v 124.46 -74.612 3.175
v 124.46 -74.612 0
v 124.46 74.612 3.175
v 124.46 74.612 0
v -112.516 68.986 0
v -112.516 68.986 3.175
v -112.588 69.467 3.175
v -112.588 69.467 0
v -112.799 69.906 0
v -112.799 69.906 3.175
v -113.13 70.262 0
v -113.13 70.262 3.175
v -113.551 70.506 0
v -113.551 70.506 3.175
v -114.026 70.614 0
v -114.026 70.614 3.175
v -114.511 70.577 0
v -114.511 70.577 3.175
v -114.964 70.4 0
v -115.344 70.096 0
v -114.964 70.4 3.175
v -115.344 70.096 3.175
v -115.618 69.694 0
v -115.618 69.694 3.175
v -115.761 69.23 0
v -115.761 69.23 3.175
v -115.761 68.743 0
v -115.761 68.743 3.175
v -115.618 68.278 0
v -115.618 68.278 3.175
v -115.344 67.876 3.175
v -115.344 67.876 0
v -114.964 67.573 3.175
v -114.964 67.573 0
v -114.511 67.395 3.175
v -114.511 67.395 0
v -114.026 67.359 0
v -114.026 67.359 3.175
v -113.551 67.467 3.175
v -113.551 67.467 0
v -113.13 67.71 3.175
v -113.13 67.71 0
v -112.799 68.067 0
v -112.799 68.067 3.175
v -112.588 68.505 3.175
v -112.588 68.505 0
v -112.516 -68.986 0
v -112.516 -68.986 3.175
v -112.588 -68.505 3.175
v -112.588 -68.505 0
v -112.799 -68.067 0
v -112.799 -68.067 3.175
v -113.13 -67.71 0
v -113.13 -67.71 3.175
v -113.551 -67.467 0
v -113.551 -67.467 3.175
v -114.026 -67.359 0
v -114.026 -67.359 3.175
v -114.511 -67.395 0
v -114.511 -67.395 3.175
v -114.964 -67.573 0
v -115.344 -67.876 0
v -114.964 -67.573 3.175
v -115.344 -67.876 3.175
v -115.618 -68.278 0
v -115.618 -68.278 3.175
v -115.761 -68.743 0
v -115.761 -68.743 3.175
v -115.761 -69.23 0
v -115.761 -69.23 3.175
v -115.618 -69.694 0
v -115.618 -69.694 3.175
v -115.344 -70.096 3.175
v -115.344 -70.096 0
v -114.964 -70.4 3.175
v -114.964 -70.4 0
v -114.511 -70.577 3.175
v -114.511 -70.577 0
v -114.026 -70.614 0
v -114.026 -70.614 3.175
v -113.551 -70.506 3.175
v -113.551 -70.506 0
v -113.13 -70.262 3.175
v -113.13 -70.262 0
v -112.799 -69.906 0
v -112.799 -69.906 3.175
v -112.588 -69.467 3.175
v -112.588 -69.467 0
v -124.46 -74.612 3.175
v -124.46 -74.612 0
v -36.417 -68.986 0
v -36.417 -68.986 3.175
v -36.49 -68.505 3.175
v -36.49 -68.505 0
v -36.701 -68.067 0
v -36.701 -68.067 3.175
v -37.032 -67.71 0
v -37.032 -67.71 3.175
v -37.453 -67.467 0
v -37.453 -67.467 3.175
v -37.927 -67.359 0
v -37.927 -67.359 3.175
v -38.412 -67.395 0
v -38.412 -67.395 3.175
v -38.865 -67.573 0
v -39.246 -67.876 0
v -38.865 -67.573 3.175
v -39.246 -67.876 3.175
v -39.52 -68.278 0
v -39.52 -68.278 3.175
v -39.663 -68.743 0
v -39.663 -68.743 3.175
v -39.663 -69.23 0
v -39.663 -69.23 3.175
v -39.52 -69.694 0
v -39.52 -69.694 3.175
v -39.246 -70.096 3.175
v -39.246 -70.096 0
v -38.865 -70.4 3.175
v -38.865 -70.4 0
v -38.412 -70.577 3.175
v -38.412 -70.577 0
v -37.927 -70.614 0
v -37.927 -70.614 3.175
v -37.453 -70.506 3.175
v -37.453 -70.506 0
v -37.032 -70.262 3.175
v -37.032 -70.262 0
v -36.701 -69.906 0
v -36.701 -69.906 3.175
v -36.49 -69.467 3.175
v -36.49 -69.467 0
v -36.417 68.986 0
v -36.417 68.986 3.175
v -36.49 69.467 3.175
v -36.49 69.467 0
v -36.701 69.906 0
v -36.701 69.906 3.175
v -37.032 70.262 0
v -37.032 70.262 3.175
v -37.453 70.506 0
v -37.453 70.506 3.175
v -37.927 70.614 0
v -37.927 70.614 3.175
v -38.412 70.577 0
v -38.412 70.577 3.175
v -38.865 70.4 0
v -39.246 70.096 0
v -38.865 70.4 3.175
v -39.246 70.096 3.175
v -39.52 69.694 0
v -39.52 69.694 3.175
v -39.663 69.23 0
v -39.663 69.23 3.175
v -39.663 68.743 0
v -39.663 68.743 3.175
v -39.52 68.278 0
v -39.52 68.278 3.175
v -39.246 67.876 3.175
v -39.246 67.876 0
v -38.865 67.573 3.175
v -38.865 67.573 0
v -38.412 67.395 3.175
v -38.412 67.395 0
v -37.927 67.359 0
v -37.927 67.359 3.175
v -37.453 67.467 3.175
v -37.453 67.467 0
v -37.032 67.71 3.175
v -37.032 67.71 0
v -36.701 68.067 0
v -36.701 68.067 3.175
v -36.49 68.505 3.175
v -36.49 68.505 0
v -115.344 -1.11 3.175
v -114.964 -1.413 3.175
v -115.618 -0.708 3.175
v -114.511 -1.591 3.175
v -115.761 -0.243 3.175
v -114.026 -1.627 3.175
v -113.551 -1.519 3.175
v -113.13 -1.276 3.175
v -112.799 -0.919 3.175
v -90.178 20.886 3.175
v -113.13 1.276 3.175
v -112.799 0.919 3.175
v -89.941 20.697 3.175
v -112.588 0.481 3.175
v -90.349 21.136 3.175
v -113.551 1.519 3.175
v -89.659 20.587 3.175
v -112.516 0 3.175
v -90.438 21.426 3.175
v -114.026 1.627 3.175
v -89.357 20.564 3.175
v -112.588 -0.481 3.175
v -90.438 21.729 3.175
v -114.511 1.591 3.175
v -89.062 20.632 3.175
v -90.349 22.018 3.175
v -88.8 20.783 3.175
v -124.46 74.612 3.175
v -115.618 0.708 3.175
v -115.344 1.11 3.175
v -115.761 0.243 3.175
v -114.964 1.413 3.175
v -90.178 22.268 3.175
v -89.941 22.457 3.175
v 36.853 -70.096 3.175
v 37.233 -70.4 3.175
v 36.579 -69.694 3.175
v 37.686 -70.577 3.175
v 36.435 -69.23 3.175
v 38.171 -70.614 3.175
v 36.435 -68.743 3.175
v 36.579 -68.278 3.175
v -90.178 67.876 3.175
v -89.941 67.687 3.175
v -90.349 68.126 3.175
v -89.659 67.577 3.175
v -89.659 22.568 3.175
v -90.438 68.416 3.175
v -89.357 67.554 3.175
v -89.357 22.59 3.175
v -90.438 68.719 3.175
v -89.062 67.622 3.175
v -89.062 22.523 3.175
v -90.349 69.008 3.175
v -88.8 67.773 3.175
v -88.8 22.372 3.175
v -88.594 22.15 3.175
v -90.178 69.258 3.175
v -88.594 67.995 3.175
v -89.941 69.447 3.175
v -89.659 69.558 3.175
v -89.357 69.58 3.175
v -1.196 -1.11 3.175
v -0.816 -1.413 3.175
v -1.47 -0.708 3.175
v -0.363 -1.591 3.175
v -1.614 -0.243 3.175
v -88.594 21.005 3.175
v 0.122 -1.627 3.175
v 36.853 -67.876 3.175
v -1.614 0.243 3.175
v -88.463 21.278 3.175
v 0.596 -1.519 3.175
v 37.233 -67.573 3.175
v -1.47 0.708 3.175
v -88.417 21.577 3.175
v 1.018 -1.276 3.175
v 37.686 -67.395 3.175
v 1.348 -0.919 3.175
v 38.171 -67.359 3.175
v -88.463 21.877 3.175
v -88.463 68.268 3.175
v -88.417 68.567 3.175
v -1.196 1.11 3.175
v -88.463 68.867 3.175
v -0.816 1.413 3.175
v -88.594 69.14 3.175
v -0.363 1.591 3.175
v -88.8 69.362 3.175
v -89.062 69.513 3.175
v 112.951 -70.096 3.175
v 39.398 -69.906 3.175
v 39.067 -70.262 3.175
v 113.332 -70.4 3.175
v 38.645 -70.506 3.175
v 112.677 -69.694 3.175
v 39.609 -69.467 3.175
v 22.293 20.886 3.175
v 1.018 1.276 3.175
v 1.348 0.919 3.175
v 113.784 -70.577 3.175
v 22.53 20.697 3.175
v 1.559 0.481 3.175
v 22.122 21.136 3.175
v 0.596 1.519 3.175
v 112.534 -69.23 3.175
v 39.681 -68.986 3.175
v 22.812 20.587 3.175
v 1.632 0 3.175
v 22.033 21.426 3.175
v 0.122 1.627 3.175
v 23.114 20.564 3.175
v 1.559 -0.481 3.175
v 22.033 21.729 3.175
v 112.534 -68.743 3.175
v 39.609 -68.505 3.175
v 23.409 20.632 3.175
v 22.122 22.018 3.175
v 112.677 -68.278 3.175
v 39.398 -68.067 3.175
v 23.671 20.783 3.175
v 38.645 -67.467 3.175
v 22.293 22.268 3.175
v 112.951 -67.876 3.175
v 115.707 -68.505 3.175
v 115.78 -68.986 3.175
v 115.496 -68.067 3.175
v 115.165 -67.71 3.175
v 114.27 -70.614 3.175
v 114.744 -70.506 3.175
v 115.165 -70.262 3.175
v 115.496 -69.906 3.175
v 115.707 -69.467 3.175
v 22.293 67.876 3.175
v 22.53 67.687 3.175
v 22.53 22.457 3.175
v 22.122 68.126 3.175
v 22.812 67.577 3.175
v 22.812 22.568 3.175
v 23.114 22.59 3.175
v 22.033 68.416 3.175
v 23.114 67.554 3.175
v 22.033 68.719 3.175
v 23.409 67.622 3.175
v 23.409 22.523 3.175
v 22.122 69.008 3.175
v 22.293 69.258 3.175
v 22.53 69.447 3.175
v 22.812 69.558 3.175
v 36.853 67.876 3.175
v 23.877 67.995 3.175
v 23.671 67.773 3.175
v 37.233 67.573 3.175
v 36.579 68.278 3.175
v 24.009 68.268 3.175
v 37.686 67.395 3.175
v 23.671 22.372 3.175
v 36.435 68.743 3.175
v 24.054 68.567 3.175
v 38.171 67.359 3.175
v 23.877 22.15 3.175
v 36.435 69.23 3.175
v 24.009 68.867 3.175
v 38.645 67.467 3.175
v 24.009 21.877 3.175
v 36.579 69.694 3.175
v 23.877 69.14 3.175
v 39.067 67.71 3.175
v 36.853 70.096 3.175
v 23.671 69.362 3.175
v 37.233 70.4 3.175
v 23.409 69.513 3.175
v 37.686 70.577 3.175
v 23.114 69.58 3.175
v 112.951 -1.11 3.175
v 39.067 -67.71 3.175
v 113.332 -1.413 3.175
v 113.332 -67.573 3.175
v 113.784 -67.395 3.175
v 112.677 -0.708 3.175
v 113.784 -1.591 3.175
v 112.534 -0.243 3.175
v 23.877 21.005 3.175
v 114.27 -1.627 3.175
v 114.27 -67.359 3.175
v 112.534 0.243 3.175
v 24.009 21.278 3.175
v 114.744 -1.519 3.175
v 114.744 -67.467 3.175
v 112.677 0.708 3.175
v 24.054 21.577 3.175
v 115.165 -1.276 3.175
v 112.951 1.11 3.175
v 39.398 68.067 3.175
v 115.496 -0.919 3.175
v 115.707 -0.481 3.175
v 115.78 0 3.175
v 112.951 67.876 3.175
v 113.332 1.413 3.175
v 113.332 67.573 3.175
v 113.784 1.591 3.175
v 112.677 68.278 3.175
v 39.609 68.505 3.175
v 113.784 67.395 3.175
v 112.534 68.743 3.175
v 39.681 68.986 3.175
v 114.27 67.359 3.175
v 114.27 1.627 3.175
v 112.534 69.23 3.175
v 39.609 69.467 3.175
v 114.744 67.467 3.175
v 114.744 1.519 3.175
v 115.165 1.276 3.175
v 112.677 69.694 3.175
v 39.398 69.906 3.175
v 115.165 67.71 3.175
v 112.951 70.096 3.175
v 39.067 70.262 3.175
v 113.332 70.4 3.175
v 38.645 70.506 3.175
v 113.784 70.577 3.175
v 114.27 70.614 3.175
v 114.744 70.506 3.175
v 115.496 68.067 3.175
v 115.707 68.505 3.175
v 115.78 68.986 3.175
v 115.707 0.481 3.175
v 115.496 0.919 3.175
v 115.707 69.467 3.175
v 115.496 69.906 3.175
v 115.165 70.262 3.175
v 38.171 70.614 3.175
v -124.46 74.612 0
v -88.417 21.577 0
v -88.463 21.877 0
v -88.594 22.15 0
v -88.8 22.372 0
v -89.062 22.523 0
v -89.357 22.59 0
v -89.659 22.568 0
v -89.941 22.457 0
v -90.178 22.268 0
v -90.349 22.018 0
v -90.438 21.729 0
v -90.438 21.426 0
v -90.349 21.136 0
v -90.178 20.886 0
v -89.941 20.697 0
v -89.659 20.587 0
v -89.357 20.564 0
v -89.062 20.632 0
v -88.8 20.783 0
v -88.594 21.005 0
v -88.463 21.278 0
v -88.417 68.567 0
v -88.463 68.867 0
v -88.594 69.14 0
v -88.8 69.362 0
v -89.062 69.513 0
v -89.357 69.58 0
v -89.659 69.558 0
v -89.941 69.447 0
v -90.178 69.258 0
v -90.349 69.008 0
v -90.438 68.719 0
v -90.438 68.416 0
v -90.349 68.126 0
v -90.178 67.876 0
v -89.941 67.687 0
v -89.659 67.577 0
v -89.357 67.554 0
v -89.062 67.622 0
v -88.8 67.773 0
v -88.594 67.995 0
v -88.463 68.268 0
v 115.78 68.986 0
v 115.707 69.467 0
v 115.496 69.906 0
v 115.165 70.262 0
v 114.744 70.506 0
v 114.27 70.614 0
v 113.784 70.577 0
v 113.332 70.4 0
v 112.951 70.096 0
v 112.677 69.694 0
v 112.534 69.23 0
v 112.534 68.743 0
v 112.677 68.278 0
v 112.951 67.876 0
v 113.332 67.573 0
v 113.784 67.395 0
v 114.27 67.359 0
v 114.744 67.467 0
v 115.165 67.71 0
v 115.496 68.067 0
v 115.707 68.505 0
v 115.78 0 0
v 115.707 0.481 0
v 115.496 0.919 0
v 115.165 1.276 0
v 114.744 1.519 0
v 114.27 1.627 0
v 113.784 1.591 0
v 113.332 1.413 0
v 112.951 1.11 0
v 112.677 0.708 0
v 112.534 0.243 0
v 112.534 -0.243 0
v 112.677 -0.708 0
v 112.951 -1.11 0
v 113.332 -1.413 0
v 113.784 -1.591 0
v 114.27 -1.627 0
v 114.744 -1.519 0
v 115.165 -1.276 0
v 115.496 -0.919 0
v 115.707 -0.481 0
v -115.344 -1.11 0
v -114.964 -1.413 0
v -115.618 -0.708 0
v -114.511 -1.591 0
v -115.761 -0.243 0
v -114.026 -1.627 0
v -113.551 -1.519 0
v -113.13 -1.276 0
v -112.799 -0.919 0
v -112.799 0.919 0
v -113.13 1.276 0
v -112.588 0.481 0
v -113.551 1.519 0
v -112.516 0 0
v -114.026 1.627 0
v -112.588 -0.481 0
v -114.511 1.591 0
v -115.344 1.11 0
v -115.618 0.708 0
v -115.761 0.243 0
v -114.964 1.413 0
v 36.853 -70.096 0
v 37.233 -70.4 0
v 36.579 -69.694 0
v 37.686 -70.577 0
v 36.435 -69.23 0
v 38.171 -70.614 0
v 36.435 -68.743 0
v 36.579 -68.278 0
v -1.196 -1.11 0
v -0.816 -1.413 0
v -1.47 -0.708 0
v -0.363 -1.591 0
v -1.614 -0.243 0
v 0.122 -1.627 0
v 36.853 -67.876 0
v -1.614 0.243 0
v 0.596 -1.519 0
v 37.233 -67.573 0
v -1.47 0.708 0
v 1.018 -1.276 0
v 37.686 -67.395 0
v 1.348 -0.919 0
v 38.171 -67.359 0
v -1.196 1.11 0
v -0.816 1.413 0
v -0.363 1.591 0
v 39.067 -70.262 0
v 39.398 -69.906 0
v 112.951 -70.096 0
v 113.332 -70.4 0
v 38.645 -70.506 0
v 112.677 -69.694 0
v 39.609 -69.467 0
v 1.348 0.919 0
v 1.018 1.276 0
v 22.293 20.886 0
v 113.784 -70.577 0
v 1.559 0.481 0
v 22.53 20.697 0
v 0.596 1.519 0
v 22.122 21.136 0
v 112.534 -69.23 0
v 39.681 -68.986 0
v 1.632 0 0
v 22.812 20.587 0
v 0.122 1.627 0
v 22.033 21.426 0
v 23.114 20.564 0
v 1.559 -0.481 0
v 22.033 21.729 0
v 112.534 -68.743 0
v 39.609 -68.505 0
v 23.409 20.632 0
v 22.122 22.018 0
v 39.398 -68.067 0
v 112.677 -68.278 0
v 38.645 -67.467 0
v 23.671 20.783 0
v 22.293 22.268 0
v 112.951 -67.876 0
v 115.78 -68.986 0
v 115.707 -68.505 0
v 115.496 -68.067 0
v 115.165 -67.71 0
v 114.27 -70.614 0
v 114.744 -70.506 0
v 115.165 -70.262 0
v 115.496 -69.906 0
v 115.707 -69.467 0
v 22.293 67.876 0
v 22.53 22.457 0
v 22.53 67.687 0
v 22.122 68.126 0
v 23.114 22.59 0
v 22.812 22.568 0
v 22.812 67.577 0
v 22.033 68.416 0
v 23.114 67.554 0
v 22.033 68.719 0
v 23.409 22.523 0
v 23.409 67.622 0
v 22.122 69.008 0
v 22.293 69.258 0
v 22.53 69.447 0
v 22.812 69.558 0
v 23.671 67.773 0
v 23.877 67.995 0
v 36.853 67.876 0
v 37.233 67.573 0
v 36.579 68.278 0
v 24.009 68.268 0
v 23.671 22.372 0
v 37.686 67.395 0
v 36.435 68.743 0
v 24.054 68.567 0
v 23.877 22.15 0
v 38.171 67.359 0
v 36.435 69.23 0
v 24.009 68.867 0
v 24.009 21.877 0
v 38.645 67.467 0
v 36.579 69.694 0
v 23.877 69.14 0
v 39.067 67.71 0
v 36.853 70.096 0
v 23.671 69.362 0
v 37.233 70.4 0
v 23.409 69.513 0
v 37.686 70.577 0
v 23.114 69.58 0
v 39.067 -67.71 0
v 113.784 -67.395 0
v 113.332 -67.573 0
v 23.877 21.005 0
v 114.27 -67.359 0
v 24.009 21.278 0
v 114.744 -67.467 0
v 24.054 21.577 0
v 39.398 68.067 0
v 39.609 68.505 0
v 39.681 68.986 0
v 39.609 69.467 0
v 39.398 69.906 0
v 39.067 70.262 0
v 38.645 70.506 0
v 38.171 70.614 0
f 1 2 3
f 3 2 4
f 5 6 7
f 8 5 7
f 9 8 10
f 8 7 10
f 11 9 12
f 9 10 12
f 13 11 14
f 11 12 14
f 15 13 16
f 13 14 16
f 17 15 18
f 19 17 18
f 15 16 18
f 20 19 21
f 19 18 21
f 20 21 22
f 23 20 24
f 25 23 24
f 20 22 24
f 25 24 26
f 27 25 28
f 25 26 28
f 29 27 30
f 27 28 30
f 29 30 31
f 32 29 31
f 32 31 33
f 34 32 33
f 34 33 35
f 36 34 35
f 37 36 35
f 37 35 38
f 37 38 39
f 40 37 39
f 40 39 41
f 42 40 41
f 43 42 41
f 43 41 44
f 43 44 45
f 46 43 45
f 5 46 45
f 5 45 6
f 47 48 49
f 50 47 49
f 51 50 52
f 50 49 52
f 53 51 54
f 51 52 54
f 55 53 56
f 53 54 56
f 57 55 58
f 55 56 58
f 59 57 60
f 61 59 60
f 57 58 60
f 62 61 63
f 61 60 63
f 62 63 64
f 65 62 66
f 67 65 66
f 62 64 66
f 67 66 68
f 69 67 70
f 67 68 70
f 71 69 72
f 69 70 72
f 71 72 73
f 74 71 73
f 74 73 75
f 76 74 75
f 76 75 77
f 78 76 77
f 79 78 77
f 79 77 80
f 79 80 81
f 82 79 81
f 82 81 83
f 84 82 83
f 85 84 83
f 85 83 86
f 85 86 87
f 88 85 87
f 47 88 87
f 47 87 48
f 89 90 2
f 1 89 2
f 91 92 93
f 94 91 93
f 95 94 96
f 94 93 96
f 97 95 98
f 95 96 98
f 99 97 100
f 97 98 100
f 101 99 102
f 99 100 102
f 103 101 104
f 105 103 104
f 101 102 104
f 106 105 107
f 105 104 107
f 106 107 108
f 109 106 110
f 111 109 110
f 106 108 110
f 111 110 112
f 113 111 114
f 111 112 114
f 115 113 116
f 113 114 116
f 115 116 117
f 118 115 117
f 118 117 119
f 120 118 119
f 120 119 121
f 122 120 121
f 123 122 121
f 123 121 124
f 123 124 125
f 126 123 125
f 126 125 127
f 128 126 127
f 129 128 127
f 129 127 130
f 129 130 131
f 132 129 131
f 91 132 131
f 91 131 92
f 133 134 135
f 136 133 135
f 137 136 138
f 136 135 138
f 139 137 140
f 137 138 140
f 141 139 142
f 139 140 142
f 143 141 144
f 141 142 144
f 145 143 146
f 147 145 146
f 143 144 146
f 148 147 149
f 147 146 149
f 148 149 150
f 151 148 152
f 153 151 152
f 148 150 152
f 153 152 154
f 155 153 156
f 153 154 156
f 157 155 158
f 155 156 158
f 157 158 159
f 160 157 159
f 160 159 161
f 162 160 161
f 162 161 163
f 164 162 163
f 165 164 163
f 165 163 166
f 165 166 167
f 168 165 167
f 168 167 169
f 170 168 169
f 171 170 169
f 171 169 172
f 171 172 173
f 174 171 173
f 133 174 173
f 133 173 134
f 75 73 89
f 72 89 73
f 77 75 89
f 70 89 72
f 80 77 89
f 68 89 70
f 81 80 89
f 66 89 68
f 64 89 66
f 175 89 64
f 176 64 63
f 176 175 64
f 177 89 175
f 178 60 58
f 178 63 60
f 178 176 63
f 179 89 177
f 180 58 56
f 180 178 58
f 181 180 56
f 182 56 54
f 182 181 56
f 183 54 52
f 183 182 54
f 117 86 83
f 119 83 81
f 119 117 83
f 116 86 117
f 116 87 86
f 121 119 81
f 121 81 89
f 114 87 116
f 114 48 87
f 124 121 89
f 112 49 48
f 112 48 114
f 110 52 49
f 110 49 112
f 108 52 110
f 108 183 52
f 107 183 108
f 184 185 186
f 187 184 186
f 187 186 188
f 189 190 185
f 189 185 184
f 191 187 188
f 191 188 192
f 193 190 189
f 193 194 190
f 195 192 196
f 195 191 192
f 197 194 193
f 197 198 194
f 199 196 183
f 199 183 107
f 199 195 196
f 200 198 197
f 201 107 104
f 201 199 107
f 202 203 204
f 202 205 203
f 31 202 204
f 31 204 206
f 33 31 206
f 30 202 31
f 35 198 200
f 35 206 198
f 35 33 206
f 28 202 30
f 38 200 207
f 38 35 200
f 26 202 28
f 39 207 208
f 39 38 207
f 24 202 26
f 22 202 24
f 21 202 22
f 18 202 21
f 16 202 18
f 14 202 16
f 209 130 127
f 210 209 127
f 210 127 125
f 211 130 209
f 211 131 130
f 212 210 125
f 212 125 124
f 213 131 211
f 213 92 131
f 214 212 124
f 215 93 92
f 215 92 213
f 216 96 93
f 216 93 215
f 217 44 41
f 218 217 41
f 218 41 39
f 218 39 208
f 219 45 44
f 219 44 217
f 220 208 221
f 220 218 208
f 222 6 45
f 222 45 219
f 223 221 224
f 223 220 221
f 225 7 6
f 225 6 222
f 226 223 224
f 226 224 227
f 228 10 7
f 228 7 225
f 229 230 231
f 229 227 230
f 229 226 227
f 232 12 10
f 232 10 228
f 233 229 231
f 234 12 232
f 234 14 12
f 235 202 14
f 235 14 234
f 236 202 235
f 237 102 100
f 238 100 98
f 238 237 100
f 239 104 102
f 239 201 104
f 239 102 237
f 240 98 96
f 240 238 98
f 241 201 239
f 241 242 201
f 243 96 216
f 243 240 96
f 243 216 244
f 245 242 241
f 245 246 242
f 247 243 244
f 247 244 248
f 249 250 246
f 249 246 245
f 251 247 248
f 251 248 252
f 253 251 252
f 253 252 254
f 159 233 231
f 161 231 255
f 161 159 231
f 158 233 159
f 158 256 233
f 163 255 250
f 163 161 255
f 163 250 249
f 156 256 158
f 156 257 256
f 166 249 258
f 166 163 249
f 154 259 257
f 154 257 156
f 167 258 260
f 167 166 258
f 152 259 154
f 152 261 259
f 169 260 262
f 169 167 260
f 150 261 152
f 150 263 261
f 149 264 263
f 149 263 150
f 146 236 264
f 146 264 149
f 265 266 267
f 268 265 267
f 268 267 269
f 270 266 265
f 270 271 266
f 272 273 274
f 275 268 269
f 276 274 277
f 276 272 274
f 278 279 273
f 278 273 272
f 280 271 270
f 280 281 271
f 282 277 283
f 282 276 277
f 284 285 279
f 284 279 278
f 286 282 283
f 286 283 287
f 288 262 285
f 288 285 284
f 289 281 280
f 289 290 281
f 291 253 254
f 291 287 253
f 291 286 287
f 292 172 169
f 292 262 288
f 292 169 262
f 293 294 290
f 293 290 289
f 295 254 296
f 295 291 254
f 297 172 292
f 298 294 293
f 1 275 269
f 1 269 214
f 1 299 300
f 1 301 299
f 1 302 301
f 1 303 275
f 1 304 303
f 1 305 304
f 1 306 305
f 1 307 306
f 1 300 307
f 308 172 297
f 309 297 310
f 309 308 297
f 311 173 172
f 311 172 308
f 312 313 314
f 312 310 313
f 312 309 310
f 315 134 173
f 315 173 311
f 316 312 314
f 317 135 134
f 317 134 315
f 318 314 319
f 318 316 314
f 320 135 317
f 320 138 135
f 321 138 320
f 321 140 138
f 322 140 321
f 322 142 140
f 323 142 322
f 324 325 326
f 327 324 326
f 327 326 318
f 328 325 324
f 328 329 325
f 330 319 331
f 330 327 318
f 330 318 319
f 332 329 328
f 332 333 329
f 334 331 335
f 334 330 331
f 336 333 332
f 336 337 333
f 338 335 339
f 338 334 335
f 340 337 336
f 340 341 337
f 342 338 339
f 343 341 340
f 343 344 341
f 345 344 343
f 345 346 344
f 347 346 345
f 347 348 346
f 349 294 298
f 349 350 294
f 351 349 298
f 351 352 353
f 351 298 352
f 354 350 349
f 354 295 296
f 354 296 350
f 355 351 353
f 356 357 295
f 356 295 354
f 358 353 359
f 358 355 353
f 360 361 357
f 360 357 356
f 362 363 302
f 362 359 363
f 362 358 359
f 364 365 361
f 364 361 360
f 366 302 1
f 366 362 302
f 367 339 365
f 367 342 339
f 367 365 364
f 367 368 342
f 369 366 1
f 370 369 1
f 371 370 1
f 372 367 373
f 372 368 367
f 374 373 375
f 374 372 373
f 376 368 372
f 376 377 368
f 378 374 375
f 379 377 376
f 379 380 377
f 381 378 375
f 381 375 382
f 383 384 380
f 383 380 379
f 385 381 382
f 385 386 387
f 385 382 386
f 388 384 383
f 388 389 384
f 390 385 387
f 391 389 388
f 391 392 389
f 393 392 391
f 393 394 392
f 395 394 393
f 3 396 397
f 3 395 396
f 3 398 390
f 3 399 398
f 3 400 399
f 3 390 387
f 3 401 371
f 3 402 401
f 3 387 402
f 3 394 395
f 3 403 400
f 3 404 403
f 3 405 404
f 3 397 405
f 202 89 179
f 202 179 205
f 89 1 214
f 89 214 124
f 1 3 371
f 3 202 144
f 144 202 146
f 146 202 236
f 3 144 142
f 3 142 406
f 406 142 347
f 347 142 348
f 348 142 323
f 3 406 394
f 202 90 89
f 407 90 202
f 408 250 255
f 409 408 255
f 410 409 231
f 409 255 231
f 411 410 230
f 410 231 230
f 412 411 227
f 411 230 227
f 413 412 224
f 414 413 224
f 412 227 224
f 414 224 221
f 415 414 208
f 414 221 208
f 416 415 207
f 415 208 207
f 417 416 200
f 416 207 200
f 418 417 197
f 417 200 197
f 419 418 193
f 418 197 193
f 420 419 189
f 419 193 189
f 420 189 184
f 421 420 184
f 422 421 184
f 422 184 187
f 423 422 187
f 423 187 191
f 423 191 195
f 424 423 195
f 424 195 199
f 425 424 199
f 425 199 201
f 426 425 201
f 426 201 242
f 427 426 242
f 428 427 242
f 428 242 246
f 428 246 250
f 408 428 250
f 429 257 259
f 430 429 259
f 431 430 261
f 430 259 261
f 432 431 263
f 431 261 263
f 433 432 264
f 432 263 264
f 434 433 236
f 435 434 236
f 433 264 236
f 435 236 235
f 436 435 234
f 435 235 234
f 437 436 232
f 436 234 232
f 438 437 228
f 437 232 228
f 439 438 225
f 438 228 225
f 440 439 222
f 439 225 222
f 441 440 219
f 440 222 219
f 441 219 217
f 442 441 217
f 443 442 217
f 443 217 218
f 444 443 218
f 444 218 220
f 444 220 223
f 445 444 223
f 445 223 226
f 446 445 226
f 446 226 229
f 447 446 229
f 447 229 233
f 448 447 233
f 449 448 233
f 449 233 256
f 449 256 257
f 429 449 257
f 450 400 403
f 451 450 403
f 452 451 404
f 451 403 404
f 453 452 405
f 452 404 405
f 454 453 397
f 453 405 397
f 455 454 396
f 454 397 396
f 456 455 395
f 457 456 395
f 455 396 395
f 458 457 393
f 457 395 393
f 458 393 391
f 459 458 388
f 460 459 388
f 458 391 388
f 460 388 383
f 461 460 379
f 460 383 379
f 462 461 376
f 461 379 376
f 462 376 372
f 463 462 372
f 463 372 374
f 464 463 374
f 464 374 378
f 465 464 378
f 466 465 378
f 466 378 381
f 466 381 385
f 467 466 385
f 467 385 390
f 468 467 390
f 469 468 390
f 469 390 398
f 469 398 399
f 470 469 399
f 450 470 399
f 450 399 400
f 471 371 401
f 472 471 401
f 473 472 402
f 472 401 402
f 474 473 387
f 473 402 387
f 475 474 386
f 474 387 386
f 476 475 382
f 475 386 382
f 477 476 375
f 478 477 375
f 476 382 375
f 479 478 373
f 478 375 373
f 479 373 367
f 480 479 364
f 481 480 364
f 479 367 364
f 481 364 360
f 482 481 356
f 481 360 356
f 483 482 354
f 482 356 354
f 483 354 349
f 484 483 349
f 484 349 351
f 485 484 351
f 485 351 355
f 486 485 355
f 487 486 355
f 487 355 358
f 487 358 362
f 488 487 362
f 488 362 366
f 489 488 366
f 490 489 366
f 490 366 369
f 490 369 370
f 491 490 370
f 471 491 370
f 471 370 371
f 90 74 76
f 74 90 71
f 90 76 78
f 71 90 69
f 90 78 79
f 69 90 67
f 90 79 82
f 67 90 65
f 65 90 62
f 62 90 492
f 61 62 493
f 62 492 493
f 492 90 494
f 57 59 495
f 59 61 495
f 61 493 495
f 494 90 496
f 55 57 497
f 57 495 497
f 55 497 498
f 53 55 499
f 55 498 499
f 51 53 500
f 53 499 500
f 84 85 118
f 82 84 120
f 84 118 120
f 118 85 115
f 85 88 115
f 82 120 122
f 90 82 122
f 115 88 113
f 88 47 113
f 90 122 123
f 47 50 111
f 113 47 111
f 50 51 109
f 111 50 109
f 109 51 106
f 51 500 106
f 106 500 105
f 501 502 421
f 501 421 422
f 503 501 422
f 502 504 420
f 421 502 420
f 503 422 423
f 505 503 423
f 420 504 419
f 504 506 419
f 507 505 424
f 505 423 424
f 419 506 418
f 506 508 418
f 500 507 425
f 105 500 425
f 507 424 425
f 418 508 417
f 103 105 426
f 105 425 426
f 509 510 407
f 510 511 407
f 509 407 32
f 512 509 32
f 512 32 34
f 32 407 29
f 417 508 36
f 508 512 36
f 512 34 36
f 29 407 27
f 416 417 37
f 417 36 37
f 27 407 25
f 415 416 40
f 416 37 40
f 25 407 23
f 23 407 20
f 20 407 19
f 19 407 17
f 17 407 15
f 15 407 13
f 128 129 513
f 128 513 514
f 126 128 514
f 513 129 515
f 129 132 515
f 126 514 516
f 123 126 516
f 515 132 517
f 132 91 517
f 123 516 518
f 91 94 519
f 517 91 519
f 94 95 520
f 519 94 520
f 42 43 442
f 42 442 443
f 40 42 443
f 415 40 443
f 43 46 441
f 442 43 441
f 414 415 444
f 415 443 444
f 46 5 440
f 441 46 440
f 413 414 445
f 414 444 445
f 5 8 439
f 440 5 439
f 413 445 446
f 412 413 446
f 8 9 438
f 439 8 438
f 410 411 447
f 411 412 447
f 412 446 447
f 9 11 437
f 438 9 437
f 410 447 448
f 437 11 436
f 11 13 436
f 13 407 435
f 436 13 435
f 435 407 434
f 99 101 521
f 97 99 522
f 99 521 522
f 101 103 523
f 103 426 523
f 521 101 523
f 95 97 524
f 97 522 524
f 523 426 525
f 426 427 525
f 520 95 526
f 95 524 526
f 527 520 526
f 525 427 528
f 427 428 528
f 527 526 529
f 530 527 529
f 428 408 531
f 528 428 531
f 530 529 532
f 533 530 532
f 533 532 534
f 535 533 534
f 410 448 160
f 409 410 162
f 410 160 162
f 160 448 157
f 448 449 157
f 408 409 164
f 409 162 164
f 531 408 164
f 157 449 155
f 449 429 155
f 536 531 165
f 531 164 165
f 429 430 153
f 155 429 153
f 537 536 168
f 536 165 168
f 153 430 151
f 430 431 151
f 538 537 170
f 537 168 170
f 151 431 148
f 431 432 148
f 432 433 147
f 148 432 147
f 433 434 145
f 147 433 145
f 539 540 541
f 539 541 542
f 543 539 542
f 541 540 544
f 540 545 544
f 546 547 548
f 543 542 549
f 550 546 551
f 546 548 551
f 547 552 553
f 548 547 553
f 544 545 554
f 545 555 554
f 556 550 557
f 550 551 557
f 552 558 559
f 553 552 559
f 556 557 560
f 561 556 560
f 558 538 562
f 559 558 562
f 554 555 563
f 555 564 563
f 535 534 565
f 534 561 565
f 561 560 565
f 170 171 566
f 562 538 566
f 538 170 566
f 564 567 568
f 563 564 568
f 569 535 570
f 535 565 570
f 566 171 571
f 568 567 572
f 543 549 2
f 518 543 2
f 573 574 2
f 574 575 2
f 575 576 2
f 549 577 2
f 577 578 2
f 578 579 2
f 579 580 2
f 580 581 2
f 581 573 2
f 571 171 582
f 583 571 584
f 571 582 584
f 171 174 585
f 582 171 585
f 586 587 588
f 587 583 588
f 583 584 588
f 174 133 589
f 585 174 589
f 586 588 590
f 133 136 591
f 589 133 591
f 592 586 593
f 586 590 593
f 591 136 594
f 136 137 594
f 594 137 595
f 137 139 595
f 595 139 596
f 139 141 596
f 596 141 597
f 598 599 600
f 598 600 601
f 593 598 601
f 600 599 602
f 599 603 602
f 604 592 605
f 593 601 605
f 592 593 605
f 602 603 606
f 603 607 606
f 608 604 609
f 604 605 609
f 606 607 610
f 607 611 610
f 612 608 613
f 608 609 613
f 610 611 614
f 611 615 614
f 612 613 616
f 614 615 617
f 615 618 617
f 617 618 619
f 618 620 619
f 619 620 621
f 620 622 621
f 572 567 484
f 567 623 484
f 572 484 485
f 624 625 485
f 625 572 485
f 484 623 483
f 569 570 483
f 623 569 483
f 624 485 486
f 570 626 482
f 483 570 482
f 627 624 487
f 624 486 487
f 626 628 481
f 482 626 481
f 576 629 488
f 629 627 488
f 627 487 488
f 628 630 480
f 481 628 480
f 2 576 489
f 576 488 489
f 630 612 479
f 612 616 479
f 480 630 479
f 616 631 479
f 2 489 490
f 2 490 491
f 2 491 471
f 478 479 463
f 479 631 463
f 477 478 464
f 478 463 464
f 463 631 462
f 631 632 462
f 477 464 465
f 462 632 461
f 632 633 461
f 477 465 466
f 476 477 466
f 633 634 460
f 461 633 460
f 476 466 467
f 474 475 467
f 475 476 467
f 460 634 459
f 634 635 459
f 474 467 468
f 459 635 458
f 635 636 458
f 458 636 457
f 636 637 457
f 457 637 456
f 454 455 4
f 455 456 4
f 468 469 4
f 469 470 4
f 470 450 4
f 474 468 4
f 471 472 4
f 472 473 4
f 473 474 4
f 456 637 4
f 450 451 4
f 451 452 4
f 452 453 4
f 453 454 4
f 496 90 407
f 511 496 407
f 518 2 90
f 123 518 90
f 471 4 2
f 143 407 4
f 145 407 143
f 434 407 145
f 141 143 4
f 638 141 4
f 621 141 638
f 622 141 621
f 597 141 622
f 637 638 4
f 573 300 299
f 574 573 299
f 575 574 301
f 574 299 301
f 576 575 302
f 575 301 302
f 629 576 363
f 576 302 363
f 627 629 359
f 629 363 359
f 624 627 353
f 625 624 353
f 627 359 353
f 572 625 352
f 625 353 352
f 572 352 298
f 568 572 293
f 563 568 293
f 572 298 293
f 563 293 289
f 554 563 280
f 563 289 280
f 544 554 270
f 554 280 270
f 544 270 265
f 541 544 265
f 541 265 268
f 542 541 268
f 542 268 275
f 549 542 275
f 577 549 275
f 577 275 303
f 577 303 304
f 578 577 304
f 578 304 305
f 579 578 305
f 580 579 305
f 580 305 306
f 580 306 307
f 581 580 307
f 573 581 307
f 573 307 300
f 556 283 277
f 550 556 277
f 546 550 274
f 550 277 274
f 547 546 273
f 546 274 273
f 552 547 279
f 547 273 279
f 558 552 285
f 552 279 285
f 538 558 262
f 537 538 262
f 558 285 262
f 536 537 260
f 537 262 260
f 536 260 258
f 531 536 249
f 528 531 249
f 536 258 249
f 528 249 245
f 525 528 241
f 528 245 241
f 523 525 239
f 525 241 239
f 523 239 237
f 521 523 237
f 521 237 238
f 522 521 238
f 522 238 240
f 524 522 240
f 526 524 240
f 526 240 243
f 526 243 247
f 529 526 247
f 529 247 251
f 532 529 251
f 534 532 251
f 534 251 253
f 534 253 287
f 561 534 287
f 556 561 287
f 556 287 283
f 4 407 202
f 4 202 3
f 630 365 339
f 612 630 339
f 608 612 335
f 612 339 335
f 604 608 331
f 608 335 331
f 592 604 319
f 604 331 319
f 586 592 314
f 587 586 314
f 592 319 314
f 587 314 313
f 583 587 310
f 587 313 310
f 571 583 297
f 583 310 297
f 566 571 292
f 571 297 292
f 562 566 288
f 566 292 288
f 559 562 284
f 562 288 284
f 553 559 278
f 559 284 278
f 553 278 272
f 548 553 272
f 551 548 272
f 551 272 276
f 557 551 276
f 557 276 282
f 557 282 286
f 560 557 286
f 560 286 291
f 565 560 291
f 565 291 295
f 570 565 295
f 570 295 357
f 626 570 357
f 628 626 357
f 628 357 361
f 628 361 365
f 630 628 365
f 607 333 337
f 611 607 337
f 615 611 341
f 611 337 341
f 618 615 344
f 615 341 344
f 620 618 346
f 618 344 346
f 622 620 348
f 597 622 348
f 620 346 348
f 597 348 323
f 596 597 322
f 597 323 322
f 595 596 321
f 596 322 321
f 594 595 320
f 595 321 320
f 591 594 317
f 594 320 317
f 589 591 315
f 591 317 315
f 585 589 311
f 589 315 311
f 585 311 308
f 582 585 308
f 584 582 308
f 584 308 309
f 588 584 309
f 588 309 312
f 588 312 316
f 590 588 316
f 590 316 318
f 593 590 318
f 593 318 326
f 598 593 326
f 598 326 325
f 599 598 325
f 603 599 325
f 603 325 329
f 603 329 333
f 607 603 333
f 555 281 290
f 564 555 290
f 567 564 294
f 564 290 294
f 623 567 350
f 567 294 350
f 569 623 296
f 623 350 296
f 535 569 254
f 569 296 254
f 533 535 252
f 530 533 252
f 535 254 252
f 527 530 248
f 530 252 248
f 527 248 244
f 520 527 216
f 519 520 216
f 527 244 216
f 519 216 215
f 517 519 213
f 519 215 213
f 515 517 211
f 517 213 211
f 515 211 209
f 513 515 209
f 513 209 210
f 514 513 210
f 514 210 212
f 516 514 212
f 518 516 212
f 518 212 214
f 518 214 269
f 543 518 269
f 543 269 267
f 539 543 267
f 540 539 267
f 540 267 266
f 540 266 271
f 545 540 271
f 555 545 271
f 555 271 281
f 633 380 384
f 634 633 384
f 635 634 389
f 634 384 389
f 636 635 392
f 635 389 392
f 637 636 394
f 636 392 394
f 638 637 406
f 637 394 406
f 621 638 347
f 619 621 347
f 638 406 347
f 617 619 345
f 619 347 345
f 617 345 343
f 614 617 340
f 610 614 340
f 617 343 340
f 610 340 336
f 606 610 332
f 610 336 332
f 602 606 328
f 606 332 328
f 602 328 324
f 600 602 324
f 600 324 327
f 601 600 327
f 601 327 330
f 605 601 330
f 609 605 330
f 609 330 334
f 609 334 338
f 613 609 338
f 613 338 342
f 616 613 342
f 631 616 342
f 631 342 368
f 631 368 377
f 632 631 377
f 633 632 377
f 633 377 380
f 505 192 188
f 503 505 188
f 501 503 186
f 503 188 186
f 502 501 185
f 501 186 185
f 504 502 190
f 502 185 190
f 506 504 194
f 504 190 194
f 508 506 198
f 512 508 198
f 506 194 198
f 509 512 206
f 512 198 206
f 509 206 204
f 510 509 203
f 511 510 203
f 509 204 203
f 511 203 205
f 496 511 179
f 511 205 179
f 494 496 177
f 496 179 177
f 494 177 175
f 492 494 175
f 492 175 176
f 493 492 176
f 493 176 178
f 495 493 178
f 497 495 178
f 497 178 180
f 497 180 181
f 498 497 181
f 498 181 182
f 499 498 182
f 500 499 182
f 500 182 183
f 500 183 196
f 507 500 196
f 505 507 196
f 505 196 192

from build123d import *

# Parameters (mm, degrees)
SKETCH1_W                 = 248.92
SKETCH1_H                 = 149.225
BOSS_EXTRUDE1_DEPTH       = 3.175
F_4_CLEARANCE_HOLE1_D     = 3.2639
F_4_CLEARANCE_HOLE1_DEPTH = 56.388
F_4_CLEARANCE_HOLE1_TIP   = 0.980574487
F_4_40_TAPPED_HOLE1_D     = 2.032
F_4_40_TAPPED_HOLE1_DEPTH = 7.62
F_4_40_TAPPED_HOLE1_TIP   = 0.610474389


with BuildPart() as part:
    # Sketch1 → Boss-Extrude1 (new body)
    with BuildSketch(Plane.XY):
        Rectangle(SKETCH1_W, SKETCH1_H)
    extrude(amount=BOSS_EXTRUDE1_DEPTH)

    # #4 Clearance Hole1
    with Locations(Plane(origin=(0, 0, 0), x_dir=(-1, 0, 0), z_dir=(0, 0, -1))):
        with Locations((114.1476, -68.9864), (-114.1476, -68.9864), (-114.1476, 68.9864), (114.1476, 68.9864), (114.1476, 0), (-114.1476, 0), (38.0492, 68.9864), (-38.0492, 68.9864), (-38.0492, -68.9864), (38.0492, -68.9864), (0, 0)):
            Hole(F_4_CLEARANCE_HOLE1_D / 2, depth=F_4_CLEARANCE_HOLE1_DEPTH)
            with Locations((0, 0, -(F_4_CLEARANCE_HOLE1_DEPTH + F_4_CLEARANCE_HOLE1_TIP / 2))):  # 118° drill point
                Cone(0, F_4_CLEARANCE_HOLE1_D / 2, F_4_CLEARANCE_HOLE1_TIP, mode=Mode.SUBTRACT)

    # #4-40 Tapped Hole1
    with Locations(Plane(origin=(0, 0, 0), x_dir=(-1, 0, 0), z_dir=(0, 0, -1))):
        with Locations((-23.0378, 21.5773), (-23.0378, 68.5673), (89.4334, 68.5673), (89.4334, 21.5773)):
            Hole(F_4_40_TAPPED_HOLE1_D / 2, depth=F_4_40_TAPPED_HOLE1_DEPTH)
            with Locations((0, 0, -(F_4_40_TAPPED_HOLE1_DEPTH + F_4_40_TAPPED_HOLE1_TIP / 2))):  # 118° drill point
                Cone(0, F_4_40_TAPPED_HOLE1_D / 2, F_4_40_TAPPED_HOLE1_TIP, mode=Mode.SUBTRACT)


solid = part.part
